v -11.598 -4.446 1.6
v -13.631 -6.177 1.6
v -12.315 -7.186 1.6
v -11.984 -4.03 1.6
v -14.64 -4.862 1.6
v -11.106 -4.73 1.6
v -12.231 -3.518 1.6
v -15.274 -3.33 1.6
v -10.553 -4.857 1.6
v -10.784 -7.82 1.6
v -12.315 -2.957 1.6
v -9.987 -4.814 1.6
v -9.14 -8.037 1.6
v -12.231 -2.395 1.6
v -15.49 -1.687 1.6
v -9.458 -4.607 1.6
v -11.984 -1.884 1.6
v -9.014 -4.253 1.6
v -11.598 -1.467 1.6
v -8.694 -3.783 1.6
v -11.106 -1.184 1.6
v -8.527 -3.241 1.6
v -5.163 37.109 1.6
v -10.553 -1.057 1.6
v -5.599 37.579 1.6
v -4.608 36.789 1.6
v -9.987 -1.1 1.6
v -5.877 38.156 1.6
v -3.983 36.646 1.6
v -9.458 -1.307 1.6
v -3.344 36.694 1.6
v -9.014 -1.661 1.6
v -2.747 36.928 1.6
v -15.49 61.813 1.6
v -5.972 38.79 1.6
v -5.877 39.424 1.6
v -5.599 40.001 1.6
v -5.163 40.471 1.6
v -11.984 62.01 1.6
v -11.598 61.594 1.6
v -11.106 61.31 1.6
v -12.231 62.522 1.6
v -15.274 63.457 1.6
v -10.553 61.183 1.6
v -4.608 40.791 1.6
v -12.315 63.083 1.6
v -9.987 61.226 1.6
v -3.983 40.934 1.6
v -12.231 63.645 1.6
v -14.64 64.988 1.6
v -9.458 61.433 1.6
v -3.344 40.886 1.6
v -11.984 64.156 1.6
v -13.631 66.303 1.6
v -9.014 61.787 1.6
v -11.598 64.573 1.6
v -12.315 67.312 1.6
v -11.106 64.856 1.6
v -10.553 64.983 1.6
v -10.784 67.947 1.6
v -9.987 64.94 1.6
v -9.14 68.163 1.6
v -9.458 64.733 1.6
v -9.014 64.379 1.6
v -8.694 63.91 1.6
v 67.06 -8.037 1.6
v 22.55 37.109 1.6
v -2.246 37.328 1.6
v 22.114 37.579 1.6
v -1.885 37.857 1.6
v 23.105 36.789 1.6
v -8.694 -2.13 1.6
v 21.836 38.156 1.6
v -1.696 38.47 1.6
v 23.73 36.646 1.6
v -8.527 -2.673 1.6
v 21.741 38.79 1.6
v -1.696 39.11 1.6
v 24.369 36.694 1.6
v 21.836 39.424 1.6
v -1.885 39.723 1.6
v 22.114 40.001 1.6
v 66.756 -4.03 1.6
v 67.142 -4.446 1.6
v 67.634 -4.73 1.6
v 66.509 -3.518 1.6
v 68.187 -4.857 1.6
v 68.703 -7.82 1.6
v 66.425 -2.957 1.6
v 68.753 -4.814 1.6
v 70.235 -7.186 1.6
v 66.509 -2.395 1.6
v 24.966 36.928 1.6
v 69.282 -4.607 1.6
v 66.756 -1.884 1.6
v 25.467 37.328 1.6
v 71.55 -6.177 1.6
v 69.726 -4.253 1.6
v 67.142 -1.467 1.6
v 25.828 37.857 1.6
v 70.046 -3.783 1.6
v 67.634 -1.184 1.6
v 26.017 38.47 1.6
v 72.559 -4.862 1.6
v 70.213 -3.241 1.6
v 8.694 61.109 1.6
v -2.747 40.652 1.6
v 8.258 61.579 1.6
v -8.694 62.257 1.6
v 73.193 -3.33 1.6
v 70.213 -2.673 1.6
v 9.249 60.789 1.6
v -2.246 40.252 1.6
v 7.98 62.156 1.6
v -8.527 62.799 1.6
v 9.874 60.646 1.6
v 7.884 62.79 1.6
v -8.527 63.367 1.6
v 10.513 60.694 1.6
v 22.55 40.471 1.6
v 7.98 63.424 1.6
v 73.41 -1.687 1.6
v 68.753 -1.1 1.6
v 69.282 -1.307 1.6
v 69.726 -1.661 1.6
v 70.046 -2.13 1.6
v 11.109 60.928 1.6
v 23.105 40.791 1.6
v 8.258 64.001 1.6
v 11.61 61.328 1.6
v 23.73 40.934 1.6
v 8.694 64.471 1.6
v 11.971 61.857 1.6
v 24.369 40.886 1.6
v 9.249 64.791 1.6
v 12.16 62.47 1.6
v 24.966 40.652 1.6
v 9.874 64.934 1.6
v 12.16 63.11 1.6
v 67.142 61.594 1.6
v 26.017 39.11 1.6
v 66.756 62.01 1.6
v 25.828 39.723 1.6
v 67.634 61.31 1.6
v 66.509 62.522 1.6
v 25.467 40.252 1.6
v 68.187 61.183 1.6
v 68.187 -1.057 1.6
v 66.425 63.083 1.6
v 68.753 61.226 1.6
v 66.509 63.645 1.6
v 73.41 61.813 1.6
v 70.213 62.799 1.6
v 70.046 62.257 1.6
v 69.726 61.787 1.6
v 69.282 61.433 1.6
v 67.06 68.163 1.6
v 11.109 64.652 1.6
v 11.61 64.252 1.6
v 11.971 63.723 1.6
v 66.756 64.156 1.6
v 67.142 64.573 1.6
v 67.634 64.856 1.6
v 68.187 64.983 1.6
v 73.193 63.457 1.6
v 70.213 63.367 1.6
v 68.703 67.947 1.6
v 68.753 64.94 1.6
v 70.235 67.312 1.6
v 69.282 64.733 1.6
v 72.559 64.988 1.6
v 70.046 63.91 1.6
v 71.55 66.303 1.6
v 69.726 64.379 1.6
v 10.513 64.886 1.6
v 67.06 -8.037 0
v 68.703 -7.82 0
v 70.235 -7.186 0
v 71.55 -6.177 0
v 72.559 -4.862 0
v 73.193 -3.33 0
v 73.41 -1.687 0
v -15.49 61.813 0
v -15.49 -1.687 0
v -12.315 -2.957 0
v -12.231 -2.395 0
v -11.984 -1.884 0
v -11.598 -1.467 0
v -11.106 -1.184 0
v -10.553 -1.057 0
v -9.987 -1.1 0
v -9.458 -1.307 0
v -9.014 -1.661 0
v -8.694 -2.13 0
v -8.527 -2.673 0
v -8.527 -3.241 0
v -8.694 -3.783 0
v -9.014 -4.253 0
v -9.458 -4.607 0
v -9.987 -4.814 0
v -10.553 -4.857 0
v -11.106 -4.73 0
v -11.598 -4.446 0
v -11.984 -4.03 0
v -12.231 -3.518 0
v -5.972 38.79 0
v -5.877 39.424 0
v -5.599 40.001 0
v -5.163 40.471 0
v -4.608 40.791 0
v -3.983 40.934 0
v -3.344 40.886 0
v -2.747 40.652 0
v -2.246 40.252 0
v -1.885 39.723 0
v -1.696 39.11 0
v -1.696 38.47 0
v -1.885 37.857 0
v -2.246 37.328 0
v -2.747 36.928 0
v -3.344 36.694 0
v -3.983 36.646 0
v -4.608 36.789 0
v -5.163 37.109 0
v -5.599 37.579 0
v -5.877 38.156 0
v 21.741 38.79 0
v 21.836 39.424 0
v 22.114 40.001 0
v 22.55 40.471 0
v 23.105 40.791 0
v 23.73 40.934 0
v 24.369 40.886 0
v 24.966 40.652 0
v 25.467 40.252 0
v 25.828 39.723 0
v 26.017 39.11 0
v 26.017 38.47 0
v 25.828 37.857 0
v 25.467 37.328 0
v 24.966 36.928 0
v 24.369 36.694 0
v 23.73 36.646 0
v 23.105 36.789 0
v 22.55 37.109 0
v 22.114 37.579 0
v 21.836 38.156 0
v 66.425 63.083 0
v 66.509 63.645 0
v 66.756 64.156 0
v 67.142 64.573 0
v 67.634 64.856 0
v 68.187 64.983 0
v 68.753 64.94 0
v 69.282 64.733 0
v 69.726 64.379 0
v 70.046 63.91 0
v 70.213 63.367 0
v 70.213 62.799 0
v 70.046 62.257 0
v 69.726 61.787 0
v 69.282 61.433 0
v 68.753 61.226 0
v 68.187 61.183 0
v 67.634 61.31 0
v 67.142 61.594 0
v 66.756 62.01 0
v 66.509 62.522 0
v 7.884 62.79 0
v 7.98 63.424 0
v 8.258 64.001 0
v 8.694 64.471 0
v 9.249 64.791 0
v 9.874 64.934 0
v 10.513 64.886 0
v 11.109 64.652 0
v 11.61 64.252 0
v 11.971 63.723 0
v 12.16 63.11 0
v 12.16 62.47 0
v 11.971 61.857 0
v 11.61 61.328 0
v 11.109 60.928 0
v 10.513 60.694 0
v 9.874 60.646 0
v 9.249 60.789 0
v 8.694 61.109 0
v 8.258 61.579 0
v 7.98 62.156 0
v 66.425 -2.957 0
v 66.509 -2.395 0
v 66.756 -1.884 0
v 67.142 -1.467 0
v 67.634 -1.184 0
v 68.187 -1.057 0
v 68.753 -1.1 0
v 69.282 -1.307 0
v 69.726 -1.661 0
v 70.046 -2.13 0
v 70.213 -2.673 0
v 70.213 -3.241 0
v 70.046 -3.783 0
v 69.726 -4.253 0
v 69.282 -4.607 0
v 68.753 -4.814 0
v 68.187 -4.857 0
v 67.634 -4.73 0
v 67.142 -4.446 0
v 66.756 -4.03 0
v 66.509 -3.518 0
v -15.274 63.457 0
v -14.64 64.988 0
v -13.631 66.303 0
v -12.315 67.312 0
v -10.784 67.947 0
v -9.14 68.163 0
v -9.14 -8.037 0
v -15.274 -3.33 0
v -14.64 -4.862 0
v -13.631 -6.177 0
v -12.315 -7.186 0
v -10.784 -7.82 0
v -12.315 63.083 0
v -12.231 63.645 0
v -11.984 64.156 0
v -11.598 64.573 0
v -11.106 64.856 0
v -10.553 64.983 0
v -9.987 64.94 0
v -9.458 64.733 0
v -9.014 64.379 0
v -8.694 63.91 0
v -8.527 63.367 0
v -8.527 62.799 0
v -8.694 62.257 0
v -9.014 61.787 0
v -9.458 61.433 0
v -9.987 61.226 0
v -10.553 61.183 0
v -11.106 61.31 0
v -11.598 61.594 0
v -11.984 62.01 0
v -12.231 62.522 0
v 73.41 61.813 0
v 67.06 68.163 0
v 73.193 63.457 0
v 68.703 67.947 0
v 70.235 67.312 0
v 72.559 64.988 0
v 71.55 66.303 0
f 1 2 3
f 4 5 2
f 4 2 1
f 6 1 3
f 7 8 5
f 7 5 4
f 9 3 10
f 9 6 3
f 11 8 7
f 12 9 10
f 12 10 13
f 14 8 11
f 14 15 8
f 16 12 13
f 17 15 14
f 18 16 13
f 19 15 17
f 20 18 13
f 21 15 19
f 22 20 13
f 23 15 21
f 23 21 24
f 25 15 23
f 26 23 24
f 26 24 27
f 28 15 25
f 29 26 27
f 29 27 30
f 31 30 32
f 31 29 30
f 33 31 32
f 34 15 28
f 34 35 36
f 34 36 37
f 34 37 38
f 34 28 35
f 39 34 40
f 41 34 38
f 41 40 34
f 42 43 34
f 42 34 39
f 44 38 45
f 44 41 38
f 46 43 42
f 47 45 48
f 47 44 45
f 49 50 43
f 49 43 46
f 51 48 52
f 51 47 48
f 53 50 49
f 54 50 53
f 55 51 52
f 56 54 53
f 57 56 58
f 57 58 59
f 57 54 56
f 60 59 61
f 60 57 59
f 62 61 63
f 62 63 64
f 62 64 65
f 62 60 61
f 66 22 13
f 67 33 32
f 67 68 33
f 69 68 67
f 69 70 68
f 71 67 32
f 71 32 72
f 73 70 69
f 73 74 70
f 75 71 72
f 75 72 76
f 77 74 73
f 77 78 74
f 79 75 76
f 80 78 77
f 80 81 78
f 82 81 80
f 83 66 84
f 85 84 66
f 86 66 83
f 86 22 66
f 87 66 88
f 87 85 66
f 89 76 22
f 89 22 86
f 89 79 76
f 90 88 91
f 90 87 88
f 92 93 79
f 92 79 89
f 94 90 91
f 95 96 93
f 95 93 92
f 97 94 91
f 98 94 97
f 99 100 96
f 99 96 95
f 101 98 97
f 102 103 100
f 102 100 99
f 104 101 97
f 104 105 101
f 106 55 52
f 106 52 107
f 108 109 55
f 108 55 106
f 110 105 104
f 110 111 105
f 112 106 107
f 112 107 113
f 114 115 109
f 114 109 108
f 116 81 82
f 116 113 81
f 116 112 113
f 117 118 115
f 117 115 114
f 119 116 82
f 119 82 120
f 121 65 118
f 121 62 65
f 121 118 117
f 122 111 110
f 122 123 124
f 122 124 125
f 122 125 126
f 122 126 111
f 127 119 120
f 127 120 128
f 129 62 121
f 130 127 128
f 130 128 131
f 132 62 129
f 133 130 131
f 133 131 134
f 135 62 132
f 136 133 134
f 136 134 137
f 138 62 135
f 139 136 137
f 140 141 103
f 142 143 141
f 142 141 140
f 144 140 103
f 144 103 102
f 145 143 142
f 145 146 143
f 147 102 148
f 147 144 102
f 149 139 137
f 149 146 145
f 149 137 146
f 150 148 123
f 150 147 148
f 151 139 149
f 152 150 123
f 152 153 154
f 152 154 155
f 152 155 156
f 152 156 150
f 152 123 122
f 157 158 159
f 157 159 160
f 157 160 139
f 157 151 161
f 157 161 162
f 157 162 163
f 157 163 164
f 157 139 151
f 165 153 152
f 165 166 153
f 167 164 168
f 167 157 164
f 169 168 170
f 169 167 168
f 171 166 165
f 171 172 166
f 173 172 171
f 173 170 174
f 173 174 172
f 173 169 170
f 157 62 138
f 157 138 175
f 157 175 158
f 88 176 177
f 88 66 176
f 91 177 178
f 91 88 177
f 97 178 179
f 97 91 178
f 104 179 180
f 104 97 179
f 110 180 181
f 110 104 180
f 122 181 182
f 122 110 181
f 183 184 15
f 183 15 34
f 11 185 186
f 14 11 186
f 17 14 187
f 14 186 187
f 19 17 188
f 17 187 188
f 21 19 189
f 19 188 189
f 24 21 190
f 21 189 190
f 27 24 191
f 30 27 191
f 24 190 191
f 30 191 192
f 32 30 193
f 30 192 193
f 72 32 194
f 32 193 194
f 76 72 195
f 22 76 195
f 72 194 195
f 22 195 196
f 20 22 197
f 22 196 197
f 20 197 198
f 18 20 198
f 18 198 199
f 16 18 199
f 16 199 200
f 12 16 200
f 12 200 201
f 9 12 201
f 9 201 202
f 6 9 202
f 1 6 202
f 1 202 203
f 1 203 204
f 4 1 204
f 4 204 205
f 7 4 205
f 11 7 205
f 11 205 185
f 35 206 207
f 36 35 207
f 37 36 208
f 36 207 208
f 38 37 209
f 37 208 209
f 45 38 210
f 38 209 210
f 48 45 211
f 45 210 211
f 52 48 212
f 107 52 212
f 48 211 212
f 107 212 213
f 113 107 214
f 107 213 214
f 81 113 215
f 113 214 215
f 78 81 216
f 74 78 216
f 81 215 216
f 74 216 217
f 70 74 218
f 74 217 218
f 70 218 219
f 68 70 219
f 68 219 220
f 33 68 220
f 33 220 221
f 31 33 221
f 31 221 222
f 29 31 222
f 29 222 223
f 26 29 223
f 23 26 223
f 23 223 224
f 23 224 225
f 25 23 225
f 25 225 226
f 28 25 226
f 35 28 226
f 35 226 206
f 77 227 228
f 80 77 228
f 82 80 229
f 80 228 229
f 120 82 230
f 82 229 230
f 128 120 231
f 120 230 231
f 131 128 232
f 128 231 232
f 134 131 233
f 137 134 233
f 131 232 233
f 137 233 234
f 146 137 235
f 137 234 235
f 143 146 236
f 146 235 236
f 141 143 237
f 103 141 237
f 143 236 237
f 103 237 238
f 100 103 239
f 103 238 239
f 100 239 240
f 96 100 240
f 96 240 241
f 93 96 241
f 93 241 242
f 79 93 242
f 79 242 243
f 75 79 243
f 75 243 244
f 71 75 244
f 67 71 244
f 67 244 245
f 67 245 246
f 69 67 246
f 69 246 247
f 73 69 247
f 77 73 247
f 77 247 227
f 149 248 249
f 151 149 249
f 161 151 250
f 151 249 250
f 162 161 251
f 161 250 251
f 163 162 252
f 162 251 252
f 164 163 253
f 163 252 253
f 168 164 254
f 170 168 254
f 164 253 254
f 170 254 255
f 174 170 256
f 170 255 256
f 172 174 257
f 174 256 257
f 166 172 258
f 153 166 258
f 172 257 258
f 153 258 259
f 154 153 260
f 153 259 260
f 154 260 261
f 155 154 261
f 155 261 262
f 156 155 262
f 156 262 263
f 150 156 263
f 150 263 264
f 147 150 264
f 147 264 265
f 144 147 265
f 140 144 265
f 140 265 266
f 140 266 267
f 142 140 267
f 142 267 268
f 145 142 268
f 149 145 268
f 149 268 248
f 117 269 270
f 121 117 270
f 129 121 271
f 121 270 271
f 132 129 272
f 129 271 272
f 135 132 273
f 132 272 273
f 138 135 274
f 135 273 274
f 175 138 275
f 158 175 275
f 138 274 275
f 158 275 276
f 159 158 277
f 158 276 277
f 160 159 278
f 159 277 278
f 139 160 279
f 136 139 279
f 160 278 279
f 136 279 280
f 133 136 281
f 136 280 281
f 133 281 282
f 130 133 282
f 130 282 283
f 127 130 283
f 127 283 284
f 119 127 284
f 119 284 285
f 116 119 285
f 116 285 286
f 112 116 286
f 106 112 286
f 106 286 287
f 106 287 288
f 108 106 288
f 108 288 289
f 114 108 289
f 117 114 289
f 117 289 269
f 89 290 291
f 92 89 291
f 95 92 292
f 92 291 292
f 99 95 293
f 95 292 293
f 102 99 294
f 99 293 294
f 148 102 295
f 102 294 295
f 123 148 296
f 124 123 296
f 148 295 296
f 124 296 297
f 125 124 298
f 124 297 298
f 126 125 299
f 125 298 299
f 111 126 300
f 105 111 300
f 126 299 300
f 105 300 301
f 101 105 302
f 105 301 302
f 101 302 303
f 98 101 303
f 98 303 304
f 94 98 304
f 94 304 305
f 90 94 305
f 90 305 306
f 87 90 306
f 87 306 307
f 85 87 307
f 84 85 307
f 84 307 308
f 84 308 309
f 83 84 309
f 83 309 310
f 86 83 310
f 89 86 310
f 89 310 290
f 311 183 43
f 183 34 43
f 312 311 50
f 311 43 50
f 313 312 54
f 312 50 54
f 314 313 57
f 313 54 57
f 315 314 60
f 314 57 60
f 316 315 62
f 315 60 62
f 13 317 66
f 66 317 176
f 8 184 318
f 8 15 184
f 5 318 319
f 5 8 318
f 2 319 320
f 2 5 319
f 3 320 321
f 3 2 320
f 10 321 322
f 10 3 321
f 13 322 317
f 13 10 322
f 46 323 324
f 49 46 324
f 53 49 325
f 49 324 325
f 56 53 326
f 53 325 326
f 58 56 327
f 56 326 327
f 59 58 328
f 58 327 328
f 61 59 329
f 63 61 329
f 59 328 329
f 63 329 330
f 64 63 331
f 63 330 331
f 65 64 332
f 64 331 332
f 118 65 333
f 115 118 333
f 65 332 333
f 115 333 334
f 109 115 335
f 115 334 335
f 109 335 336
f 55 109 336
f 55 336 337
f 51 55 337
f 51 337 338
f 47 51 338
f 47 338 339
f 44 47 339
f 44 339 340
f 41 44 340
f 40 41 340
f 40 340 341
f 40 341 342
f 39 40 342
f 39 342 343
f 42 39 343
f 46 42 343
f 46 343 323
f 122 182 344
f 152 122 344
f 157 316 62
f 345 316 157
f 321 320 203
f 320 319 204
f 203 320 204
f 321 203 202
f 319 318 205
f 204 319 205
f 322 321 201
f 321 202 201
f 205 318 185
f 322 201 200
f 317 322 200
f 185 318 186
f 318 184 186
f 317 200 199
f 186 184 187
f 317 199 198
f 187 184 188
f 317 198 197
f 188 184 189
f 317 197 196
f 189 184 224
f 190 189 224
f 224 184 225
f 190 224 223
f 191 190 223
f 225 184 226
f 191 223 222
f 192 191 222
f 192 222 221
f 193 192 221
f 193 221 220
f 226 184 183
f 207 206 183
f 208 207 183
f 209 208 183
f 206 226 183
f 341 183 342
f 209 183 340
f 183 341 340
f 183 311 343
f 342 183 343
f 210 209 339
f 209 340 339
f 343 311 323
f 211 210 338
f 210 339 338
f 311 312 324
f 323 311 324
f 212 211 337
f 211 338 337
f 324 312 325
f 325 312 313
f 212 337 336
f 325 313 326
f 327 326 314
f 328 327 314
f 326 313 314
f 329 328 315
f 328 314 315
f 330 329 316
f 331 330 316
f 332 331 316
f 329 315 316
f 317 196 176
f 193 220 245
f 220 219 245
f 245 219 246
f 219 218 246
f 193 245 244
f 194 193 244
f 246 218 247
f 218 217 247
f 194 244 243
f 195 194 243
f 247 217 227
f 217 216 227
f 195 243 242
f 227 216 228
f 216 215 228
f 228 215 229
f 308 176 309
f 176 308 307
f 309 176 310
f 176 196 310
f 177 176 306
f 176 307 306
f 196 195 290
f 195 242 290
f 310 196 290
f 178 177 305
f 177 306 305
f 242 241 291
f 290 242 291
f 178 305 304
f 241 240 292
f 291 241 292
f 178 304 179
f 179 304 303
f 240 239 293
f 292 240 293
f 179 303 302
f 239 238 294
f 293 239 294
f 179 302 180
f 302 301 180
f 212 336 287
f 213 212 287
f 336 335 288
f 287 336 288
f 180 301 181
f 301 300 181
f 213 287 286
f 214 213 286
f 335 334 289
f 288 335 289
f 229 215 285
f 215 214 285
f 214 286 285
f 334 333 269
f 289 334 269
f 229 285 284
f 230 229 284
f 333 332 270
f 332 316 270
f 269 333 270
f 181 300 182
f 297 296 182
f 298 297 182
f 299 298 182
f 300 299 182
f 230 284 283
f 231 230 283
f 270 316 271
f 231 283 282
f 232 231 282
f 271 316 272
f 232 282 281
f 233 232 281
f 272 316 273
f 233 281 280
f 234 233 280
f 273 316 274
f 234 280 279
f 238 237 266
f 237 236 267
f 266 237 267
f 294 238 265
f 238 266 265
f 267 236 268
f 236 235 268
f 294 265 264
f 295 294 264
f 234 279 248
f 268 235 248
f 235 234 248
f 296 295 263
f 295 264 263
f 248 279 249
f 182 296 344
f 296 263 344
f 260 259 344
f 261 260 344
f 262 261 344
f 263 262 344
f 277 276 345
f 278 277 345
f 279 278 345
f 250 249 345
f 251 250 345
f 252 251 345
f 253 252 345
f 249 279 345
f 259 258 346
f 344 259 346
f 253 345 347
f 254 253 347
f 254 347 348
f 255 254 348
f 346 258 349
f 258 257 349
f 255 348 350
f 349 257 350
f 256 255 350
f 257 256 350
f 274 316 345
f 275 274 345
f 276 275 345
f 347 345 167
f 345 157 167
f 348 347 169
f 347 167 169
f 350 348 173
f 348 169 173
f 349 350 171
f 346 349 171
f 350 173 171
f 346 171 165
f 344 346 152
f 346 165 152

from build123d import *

# Parameters (mm, degrees)
SKETCH1_W           = 88.9
SKETCH1_H           = 76.2
BOSS_EXTRUDE1_DEPTH = 1.6
SKETCH2_R           = 2.15
CUT_EXTRUDE1_DEPTH  = 2.6
SKETCH4_R           = 1.905
CUT_EXTRUDE2_DEPTH  = 2.6
FILLET1_R           = 6.35


with BuildPart() as part:
    # Sketch1 → Boss-Extrude1 (new body)
    with BuildSketch(Plane.XY):
        with Locations((28.959521177, 30.063142475)):
            Rectangle(SKETCH1_W, SKETCH1_H)
    extrude(amount=BOSS_EXTRUDE1_DEPTH)

    # Sketch2 → Cut-Extrude1 (cut, through all)
    with BuildSketch(Plane(origin=(0, 0, 0), x_dir=(-1, 0, 0), z_dir=(0, 0, -1))):
        with Locations((-23.890706089, 38.789996981)):
            Circle(SKETCH2_R)
        with Locations((3.822106833, 38.789996981)):
            Circle(SKETCH2_R)
        with Locations((-10.034299628, 62.789996981)):
            Circle(SKETCH2_R)
    extrude(amount=-CUT_EXTRUDE1_DEPTH, mode=Mode.SUBTRACT)

    # Sketch4 → Cut-Extrude2 (cut, through all)
    with BuildSketch(Plane(origin=(0, 0, 0), x_dir=(-1, 0, 0), z_dir=(0, 0, -1))):
        with Locations((10.410478823, 63.083142475)):
            Circle(SKETCH4_R)
        with Locations((-68.329521177, 63.083142475)):
            Circle(SKETCH4_R)
        with Locations((-68.329521177, -2.956857525)):
            Circle(SKETCH4_R)
        with Locations((10.410478823, -2.956857525)):
            Circle(SKETCH4_R)
    extrude(amount=-CUT_EXTRUDE2_DEPTH, mode=Mode.SUBTRACT)

    # Fillet1
    fillet1_edges = [part.edges().sort_by_distance(p)[0] for p in [
        (-15.490478823, 68.163142475, 0.8),
        (73.409521177, 68.163142475, 0.8),
        (73.409521177, -8.036857525, 0.8),
        (-15.490478823, -8.036857525, 0.8),
    ]]
    fillet(fillet1_edges, radius=FILLET1_R)


solid = part.part
